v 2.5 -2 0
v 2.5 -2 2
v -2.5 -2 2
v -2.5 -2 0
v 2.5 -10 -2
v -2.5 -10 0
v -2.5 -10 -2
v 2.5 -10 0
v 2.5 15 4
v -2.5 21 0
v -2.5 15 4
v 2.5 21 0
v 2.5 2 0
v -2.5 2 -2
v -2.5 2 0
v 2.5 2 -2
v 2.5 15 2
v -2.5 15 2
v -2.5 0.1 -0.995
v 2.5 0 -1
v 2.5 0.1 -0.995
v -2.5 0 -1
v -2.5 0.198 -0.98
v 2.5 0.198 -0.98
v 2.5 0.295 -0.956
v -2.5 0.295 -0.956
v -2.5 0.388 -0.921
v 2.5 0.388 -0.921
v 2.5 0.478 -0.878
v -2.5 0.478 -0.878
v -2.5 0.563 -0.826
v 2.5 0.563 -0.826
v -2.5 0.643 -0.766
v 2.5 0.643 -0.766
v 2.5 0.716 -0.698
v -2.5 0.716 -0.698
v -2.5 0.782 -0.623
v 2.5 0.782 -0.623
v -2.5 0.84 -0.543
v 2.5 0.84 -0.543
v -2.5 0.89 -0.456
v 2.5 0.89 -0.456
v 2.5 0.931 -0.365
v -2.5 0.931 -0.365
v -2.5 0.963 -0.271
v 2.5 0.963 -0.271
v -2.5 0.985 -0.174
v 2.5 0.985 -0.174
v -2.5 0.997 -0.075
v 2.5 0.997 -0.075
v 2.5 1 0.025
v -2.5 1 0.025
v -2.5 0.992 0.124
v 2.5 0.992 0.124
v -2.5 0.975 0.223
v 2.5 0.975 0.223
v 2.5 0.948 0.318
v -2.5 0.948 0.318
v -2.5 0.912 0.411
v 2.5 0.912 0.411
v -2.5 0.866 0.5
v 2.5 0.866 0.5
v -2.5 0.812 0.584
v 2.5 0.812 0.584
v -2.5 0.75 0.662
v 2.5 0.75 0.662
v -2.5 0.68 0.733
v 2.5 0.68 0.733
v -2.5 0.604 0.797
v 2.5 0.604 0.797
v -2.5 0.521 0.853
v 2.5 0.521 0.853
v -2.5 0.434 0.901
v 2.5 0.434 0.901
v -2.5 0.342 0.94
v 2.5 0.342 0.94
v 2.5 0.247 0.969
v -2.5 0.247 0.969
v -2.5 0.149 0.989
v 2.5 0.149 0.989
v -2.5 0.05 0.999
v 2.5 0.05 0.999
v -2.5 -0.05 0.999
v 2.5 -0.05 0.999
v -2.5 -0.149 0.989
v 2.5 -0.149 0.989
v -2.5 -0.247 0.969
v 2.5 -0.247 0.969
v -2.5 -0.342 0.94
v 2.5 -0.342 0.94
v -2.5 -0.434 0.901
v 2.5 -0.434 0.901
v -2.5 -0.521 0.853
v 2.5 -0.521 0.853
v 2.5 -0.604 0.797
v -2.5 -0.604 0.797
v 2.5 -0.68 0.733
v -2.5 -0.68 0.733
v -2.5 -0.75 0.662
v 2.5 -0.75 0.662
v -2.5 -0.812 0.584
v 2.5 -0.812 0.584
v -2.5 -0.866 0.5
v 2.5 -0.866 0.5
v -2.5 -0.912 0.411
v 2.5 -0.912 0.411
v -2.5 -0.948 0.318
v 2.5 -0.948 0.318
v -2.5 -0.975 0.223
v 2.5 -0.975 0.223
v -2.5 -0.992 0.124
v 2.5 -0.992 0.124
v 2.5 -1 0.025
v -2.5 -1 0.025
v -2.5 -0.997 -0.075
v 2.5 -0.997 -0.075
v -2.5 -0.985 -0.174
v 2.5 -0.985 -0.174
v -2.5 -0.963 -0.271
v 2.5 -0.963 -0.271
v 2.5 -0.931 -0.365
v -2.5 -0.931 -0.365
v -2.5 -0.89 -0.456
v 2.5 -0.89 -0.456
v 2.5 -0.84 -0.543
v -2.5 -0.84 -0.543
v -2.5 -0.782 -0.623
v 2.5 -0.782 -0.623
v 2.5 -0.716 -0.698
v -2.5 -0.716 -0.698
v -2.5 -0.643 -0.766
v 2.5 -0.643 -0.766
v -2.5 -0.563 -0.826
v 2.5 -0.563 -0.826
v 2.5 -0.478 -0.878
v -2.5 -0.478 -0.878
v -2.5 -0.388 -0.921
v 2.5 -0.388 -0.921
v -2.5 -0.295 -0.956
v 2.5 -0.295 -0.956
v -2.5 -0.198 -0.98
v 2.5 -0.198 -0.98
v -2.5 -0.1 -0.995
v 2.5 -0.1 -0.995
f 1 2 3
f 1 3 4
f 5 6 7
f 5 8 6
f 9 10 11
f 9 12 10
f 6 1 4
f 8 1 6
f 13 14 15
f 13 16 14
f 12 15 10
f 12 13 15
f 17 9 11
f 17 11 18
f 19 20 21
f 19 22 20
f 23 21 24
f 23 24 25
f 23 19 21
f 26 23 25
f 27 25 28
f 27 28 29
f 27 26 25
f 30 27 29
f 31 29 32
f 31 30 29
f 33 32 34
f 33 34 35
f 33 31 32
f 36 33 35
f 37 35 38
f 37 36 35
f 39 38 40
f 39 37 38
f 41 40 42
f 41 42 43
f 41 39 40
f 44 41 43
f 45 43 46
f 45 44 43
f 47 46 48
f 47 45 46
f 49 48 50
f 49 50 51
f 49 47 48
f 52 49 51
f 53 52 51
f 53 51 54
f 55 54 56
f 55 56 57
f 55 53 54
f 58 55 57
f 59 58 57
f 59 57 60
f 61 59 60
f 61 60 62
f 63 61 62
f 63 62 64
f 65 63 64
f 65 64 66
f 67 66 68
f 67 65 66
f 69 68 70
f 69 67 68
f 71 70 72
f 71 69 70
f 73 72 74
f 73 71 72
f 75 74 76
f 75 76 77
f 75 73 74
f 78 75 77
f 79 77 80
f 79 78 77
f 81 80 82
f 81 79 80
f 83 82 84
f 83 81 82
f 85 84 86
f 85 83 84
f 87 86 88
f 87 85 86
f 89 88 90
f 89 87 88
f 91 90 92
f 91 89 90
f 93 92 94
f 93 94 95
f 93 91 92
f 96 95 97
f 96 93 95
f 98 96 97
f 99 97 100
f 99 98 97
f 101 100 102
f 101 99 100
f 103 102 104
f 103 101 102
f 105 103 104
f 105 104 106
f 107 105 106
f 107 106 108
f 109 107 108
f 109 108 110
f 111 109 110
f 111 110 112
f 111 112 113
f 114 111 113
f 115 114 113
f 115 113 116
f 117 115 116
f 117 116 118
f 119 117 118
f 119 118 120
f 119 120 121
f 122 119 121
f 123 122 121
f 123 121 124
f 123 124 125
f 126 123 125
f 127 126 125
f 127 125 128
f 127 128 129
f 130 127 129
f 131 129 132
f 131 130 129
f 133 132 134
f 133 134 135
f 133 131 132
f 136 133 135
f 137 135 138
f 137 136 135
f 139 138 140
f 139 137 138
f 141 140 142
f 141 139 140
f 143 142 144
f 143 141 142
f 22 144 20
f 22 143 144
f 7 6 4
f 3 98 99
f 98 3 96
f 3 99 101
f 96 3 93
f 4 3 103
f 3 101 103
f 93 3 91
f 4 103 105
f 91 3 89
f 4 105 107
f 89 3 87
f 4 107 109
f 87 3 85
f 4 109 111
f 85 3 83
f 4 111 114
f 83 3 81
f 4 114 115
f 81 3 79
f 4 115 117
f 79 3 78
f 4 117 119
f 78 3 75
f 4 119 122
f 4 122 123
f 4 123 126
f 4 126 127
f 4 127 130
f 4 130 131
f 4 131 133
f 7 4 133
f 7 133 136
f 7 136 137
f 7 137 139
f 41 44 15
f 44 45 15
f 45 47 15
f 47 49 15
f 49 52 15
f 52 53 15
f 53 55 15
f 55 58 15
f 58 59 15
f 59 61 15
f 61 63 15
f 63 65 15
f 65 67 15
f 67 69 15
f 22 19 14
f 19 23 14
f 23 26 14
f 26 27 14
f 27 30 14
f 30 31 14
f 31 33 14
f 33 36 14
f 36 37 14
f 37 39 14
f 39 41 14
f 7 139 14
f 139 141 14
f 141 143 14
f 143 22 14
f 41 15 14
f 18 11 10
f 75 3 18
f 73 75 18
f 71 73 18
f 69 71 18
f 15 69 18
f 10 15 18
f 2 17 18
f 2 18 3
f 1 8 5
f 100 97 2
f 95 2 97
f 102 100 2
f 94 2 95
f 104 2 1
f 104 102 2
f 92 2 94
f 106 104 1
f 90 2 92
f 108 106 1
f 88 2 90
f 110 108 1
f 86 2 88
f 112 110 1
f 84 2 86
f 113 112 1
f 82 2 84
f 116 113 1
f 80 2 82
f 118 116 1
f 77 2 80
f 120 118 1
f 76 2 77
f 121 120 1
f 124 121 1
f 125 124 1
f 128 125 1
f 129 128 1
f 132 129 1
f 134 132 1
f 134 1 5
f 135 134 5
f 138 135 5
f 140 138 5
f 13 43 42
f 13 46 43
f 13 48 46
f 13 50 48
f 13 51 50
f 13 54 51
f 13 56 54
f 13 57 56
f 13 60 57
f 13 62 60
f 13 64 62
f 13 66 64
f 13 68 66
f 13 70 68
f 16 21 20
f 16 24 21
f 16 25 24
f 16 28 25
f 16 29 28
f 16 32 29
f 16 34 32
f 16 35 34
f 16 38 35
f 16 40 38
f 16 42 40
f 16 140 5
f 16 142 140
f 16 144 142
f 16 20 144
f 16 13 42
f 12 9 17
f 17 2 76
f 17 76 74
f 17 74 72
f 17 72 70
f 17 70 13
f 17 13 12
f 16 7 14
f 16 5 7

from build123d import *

# Parameters (mm, degrees)
SKIZZE1_R               = 1
LINEAR_AUSTRAGEN1_DEPTH = 2.5


with BuildPart() as part:
    # Skizze1 → Linear austragen1 (new body, symmetric)
    with BuildSketch(Plane(origin=(0, 0, 0), x_dir=(0, 0, -1), z_dir=(1, 0, 0))):
        Polygon((0, 21), (-4, 15), (-2, 15), (-2, -2), (0, -2), (0, -10), (2, -10), (2, 2), (0, 2), align=None)
        Circle(SKIZZE1_R, mode=Mode.SUBTRACT)
    extrude(amount=LINEAR_AUSTRAGEN1_DEPTH, both=True)


solid = part.part
